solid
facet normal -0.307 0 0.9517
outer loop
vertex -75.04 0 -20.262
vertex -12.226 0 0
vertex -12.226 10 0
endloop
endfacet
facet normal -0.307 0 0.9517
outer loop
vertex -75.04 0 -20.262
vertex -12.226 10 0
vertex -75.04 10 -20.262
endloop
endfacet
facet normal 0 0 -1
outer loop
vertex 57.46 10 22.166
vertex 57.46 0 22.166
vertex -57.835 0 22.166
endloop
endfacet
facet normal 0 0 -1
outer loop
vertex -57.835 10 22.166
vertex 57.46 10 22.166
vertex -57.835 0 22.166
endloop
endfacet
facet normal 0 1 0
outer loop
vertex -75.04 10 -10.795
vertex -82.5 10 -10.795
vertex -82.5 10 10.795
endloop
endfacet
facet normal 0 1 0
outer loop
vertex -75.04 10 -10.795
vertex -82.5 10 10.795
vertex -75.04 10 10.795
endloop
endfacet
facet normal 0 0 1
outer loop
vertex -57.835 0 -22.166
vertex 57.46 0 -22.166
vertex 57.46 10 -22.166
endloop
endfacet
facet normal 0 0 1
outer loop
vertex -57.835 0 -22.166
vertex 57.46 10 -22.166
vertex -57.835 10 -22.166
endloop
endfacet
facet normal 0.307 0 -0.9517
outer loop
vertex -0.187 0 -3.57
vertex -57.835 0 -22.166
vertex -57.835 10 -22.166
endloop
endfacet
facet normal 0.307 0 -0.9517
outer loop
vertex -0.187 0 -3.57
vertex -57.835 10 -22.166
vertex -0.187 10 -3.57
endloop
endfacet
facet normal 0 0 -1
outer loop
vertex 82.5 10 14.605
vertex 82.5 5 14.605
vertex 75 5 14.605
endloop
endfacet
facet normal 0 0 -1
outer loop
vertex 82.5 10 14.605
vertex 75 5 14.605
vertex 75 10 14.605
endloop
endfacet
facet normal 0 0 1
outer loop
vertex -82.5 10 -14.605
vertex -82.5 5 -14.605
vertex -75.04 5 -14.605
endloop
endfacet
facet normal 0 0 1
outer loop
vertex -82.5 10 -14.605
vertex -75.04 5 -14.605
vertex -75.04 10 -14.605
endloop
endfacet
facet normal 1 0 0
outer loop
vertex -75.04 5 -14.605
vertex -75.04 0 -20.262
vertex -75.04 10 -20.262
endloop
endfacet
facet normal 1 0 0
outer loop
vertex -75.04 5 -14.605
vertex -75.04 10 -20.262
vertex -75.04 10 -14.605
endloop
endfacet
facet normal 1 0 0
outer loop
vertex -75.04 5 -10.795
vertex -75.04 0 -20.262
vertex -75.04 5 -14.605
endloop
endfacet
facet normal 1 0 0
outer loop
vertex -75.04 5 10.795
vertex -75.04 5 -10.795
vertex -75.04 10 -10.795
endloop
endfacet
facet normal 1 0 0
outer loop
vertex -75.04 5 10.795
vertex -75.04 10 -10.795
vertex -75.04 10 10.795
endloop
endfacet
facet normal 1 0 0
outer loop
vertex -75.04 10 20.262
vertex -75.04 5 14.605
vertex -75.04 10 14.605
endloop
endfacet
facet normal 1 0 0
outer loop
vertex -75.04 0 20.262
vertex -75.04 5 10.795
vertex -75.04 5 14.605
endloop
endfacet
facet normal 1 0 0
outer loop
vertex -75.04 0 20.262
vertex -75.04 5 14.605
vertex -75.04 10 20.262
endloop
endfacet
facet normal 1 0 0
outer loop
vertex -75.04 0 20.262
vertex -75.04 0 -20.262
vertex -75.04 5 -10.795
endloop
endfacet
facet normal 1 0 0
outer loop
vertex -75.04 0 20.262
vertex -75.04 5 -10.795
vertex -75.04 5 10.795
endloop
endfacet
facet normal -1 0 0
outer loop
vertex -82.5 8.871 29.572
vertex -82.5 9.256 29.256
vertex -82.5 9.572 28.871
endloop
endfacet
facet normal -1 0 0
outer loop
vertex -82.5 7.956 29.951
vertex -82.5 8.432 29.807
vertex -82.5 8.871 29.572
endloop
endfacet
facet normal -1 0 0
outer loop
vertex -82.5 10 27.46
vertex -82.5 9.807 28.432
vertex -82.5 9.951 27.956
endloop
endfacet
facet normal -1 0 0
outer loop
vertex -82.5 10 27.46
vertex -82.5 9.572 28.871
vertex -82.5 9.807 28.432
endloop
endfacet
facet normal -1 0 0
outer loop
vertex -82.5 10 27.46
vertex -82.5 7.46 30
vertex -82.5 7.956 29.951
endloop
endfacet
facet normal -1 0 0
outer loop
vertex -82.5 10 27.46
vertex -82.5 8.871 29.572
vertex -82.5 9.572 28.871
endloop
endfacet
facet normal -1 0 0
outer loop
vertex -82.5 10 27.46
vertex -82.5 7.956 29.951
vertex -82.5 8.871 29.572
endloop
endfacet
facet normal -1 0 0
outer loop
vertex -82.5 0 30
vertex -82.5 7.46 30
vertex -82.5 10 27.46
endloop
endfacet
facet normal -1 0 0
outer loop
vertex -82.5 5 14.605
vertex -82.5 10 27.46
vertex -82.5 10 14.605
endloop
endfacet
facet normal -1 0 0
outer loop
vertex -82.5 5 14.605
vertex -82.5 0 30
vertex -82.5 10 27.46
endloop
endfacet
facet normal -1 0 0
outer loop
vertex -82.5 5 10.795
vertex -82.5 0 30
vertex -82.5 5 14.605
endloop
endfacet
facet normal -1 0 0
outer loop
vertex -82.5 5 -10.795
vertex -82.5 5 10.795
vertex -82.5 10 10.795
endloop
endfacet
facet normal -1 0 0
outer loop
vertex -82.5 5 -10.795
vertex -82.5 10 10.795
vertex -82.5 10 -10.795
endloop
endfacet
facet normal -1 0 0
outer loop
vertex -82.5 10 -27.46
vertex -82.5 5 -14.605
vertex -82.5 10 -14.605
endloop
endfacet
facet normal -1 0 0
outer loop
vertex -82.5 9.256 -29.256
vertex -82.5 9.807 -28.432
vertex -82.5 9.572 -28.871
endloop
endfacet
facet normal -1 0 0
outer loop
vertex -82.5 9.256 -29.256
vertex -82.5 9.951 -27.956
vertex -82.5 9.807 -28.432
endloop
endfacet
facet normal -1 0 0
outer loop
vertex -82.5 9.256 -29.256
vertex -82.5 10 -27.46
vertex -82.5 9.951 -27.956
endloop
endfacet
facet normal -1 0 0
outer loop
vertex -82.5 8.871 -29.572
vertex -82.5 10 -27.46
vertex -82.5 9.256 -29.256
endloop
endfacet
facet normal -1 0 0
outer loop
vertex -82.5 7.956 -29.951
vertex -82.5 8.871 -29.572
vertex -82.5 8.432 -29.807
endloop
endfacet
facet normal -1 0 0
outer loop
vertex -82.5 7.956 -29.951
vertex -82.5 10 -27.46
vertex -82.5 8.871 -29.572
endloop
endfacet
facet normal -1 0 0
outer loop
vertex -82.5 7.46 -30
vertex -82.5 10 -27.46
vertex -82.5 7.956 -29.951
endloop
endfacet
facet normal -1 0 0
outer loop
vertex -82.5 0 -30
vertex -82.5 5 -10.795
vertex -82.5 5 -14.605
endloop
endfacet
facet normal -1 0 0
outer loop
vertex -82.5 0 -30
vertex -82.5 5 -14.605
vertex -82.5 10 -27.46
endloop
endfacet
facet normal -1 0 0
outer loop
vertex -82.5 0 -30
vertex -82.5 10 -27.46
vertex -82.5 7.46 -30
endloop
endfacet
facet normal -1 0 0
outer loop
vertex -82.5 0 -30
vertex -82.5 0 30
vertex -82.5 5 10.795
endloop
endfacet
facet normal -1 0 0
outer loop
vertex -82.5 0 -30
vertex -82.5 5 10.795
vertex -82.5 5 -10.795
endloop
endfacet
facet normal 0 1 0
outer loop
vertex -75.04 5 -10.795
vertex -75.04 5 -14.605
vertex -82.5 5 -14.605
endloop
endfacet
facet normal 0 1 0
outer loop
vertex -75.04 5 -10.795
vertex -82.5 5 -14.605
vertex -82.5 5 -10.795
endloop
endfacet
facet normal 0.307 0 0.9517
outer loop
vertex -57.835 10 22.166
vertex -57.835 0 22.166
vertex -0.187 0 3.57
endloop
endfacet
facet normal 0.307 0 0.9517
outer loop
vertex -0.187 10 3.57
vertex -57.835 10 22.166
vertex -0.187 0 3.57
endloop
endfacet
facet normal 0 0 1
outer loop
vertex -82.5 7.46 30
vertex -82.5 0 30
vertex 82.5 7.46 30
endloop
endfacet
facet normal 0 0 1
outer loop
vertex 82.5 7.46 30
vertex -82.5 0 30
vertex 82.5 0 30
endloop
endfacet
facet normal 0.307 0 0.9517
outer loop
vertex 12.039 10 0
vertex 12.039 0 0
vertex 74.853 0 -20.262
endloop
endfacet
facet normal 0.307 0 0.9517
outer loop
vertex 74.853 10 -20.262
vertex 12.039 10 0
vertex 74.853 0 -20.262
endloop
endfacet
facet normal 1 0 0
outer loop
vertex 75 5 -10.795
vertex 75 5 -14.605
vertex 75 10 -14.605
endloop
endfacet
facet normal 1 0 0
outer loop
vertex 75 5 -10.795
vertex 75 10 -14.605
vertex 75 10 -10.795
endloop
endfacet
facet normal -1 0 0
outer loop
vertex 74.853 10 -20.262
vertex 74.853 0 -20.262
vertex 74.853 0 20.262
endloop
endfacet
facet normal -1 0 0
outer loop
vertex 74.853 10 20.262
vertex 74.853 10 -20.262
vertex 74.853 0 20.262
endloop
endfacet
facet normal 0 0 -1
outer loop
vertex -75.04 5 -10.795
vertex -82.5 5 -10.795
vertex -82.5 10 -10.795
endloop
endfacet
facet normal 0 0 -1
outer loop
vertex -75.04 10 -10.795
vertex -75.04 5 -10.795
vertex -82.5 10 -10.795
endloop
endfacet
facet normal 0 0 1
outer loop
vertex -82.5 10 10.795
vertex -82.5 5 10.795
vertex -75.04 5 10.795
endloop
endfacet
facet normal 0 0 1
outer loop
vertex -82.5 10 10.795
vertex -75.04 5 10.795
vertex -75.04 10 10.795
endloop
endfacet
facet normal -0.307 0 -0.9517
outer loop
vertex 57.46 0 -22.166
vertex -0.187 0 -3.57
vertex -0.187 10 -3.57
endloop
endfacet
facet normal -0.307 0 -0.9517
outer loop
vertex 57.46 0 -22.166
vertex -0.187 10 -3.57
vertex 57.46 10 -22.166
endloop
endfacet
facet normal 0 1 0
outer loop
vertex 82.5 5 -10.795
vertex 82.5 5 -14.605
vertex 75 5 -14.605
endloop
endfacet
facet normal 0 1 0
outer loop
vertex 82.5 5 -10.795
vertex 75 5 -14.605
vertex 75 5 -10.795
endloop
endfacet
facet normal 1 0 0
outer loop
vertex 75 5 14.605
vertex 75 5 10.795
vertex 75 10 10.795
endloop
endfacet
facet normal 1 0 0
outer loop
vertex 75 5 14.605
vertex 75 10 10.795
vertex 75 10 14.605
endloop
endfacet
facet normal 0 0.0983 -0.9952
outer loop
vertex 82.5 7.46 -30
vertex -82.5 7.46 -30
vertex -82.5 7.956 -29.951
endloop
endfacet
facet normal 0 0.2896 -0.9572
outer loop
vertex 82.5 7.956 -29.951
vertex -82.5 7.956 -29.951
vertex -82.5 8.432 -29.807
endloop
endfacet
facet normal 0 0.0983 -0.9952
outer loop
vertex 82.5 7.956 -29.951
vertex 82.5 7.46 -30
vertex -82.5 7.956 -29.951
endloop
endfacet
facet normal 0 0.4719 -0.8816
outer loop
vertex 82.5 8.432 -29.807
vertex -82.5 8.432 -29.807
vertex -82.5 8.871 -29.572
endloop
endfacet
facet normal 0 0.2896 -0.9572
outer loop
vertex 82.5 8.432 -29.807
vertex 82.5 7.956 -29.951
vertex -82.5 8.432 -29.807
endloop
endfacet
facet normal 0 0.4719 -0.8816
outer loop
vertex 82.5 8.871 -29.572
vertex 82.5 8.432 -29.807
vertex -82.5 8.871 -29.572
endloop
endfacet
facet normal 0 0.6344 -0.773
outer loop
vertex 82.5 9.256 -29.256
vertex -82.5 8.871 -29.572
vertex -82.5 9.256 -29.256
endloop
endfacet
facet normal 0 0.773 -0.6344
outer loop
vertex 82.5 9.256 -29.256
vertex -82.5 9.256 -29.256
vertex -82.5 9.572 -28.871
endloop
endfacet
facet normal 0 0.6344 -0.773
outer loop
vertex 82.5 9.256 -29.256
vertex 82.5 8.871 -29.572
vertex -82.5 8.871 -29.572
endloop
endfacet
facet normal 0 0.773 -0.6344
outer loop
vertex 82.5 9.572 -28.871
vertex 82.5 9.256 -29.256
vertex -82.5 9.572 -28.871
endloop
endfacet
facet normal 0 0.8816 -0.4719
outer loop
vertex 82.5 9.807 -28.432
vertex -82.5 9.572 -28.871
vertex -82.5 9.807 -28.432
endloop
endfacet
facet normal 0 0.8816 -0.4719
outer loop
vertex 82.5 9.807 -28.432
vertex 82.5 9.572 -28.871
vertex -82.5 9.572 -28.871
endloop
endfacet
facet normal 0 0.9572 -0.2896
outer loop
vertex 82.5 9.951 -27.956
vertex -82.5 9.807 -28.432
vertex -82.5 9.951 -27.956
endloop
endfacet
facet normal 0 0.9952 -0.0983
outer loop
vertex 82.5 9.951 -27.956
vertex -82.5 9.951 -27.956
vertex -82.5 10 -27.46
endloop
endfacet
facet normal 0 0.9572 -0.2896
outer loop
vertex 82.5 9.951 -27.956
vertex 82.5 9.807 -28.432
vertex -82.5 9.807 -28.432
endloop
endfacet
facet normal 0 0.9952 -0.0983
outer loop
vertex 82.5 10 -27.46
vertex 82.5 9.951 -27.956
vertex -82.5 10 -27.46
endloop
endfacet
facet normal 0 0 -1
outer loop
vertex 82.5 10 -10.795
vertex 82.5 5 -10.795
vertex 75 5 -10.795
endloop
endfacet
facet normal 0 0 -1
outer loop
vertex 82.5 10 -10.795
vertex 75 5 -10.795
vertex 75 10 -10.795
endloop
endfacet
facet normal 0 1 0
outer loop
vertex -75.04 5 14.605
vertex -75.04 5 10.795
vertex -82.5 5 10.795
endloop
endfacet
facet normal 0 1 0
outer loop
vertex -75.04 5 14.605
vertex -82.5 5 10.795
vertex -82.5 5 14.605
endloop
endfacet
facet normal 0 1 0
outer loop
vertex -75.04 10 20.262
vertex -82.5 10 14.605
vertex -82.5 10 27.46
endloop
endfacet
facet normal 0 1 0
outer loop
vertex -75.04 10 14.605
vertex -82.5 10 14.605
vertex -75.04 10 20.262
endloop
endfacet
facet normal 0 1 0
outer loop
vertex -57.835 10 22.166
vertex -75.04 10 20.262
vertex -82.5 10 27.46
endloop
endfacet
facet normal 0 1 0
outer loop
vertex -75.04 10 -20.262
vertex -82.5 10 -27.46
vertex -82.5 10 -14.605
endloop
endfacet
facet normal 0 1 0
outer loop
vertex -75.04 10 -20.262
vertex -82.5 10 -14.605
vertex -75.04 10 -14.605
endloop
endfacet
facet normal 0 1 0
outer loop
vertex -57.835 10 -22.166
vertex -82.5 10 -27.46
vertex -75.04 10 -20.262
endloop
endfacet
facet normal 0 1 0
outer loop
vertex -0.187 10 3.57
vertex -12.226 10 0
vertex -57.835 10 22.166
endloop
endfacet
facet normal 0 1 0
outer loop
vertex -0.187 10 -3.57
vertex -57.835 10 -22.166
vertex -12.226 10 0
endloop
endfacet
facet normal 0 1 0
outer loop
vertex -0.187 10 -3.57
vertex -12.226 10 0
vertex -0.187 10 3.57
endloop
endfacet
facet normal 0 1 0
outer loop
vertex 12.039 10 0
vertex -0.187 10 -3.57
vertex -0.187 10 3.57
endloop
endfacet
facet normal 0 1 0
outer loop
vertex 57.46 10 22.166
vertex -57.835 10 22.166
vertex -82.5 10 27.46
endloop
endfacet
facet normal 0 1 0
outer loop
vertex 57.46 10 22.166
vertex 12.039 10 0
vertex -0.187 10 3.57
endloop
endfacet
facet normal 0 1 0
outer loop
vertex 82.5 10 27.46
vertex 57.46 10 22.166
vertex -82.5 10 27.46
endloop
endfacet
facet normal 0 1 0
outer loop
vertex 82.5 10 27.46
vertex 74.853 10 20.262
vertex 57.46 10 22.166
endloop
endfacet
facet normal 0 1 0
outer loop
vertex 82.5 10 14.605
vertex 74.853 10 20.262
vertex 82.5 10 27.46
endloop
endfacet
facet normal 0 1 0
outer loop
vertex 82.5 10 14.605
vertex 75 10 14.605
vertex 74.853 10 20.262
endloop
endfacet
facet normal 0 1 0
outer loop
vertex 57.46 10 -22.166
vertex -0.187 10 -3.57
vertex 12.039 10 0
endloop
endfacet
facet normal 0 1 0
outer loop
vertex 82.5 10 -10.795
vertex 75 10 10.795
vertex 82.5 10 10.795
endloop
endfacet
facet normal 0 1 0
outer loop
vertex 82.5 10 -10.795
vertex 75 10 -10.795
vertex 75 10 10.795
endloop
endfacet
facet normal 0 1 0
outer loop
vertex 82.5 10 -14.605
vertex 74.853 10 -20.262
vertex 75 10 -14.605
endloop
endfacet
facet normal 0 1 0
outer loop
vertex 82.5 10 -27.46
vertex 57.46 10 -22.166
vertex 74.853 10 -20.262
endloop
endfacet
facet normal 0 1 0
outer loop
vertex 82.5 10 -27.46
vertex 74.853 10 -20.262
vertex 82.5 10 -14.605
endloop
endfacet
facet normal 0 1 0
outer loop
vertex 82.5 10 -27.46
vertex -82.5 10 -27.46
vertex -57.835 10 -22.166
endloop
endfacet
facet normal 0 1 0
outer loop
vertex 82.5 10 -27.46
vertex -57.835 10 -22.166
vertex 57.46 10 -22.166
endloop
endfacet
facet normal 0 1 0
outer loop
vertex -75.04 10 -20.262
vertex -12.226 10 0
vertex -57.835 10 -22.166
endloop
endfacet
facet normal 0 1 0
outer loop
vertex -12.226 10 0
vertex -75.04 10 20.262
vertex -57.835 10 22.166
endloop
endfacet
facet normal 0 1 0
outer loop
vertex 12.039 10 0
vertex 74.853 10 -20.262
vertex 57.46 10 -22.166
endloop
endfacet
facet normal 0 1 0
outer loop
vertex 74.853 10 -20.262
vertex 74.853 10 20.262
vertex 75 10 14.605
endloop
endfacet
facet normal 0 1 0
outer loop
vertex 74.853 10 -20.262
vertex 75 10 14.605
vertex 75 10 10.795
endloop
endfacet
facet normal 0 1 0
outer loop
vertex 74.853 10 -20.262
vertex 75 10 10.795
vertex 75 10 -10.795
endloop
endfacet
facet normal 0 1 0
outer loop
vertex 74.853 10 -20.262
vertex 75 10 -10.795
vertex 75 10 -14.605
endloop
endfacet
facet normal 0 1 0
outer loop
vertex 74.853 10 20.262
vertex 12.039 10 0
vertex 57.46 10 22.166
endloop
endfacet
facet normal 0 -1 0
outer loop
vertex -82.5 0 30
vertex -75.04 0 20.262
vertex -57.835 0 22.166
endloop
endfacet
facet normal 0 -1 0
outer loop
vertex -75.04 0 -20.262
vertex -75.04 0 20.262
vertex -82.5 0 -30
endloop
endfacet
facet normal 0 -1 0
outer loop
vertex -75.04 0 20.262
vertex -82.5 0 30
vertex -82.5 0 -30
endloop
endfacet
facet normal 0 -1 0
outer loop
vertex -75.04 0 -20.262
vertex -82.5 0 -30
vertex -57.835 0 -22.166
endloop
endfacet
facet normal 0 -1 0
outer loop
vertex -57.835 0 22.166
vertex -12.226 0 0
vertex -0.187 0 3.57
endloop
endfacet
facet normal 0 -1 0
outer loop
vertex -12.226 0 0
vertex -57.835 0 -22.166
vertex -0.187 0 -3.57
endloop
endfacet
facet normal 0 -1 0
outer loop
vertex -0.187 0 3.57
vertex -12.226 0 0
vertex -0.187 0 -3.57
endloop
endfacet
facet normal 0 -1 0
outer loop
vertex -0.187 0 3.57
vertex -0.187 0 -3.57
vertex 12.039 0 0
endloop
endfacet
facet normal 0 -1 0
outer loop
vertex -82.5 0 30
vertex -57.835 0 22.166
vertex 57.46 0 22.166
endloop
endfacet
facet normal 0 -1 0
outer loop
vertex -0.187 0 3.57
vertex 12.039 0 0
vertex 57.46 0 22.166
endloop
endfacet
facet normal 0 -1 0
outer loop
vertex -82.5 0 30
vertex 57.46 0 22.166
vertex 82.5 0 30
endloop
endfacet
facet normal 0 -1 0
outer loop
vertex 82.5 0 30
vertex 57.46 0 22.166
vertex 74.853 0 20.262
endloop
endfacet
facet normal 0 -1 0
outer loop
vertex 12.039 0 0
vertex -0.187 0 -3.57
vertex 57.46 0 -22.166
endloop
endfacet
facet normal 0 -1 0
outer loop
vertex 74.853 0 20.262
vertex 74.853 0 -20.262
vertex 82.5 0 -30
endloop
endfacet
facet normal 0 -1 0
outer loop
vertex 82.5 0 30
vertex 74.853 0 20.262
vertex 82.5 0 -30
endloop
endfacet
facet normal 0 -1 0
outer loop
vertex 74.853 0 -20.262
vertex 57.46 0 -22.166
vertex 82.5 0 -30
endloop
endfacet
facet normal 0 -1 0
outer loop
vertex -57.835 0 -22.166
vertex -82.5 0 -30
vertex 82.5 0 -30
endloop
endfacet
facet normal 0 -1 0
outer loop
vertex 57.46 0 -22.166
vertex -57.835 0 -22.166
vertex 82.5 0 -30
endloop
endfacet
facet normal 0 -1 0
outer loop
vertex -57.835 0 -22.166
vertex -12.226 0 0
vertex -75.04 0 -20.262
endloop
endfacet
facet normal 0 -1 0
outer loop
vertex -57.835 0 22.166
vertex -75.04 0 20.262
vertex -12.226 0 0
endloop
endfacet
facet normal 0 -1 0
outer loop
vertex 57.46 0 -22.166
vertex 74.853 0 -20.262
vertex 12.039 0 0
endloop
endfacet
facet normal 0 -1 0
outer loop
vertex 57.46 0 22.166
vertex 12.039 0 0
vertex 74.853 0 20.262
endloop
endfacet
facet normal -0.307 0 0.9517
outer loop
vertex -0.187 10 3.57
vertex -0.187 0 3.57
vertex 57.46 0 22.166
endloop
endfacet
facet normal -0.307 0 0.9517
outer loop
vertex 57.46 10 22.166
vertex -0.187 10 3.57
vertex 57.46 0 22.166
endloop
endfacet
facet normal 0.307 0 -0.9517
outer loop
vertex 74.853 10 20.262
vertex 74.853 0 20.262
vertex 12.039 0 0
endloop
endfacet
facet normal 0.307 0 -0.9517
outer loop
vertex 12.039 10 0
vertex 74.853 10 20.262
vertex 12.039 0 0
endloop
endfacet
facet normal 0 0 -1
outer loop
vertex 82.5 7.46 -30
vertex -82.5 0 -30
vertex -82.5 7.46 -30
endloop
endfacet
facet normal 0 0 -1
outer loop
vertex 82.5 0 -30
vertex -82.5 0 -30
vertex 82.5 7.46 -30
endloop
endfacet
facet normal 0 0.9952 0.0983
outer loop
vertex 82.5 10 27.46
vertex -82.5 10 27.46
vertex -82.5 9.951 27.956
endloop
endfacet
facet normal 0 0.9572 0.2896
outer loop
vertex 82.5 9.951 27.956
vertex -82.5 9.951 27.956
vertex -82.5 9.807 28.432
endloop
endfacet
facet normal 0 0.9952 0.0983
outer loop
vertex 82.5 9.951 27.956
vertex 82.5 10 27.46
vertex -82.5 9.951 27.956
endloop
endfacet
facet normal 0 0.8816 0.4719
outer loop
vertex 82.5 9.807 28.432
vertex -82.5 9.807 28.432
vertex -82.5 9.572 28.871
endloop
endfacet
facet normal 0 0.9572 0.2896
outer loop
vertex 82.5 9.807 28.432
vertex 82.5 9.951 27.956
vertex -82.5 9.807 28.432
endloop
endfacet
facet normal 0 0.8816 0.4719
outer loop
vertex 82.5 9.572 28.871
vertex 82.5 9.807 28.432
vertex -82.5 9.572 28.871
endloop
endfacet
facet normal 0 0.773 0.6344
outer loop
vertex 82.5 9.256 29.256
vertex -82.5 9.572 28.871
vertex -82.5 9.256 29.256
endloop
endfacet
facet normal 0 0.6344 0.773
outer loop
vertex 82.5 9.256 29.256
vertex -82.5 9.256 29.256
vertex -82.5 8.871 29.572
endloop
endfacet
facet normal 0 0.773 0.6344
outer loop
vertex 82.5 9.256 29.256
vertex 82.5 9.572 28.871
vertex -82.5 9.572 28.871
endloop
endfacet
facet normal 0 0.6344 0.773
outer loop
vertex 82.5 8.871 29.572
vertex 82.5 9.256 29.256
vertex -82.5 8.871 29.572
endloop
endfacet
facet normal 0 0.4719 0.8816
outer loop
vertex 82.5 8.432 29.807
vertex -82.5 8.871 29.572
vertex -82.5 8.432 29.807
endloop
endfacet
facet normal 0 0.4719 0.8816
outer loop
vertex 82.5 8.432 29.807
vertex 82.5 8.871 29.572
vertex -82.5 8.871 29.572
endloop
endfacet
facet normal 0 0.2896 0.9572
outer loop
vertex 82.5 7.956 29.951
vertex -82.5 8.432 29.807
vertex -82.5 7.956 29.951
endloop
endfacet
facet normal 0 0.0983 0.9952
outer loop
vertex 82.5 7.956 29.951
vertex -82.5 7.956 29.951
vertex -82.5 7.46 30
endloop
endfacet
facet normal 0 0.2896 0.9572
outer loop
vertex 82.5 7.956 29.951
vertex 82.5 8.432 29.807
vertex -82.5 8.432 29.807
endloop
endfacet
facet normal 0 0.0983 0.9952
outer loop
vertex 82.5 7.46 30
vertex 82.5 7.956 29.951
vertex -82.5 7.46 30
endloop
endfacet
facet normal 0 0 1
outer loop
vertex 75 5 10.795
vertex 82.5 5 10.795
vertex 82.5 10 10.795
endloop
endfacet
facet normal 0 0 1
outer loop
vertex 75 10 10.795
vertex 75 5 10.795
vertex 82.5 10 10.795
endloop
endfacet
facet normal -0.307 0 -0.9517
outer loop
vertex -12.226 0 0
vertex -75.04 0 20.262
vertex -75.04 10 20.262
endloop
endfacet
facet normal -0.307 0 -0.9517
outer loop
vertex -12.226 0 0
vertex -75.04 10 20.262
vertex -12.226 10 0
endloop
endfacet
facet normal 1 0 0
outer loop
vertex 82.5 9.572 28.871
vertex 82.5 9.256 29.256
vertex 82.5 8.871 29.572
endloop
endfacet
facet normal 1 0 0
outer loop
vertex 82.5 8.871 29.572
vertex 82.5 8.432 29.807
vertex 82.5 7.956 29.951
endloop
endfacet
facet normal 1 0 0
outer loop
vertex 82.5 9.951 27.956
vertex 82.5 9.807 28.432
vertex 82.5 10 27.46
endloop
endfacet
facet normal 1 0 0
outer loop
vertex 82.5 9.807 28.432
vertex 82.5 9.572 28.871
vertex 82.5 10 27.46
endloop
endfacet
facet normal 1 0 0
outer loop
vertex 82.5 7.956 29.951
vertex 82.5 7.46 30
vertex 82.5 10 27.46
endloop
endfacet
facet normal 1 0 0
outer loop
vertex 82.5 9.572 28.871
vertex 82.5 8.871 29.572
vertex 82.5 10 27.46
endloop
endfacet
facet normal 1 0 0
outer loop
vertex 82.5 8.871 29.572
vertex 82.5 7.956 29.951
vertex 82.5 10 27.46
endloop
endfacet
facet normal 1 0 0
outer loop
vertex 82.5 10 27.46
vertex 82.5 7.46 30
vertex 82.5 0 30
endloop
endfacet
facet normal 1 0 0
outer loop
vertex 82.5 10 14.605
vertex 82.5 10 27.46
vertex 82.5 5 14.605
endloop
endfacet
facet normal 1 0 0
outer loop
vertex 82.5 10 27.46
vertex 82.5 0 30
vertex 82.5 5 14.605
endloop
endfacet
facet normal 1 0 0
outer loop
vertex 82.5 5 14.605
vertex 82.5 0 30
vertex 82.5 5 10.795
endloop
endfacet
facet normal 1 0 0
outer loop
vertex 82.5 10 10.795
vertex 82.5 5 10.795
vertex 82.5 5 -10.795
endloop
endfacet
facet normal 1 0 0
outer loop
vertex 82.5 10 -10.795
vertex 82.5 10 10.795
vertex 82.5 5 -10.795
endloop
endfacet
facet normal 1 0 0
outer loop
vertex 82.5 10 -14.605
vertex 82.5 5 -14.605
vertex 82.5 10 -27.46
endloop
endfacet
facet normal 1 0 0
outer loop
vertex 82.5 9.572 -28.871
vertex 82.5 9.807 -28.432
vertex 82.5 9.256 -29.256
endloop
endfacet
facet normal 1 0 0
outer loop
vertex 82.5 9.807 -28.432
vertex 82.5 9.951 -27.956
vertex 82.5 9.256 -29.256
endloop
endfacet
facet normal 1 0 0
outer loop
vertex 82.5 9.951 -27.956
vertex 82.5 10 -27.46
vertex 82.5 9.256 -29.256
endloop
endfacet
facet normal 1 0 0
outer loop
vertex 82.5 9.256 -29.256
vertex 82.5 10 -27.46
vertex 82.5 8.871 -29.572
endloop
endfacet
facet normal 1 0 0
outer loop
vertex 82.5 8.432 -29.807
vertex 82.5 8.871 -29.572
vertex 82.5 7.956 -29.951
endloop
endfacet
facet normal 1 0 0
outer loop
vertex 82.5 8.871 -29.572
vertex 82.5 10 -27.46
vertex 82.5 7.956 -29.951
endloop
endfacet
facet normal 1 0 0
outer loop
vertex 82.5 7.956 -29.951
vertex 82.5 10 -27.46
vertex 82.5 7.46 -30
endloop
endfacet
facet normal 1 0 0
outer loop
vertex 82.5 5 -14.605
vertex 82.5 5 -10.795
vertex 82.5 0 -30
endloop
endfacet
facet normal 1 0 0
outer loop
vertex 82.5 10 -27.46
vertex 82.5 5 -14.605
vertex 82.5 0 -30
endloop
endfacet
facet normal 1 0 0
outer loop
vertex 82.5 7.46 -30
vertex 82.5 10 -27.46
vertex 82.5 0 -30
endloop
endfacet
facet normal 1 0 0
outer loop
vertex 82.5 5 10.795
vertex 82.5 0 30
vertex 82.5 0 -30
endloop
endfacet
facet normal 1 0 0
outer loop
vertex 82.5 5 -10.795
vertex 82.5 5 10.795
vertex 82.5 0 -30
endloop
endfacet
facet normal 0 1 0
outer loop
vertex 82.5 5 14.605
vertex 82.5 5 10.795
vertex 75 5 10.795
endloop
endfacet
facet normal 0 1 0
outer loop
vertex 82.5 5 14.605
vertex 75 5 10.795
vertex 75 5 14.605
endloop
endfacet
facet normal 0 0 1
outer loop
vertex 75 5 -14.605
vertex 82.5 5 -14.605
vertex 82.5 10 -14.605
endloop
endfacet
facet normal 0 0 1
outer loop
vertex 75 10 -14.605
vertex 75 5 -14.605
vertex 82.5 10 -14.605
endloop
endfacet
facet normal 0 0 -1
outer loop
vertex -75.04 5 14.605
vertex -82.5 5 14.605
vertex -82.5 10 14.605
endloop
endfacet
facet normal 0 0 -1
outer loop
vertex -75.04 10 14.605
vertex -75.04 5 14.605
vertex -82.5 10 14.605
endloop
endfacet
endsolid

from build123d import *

# Parameters (mm, degrees)
SKETCH1_W           = 165
SKETCH1_H           = 60
BOSS_EXTRUDE1_DEPTH = 10
SKETCH2_W           = 3.81
SKETCH2_H           = 5
CUT_EXTRUDE1_DEPTH  = 7.5
FILLET1_R           = 2.54


with BuildPart() as part:
    # Sketch1 → Boss-Extrude1 (new body)
    with BuildSketch(Plane(origin=(0, 0, 0), x_dir=(1, 0, 0), z_dir=(0, 1, 0))):
        Rectangle(SKETCH1_W, SKETCH1_H)
        Polygon((-75.04, 20.262432489), (-75.04, -20.262432489), (-12.226459283, 0), align=None, mode=Mode.SUBTRACT)
        Polygon((57.460458264, 22.165834991), (-57.834623171, 22.165834991), (-0.187082453, 3.569854115), align=None, mode=Mode.SUBTRACT)
        Polygon((74.852917547, 20.262432489), (74.852917547, -20.262432489), (12.039376829, 0), align=None, mode=Mode.SUBTRACT)
        Polygon((-57.834623171, -22.165834991), (-0.187082453, -3.569854115), (57.460458264, -22.165834991), align=None, mode=Mode.SUBTRACT)
    extrude(amount=BOSS_EXTRUDE1_DEPTH)

    # Sketch2 → Cut-Extrude1 (cut)
    with BuildSketch(Plane.ZY.offset(82.5)):
        with Locations((-12.7, 7.5)):
            Rectangle(SKETCH2_W, SKETCH2_H)
        with Locations((12.7, 7.5)):
            Rectangle(SKETCH2_W, SKETCH2_H)
    cut_extrude1 = extrude(amount=-CUT_EXTRUDE1_DEPTH, mode=Mode.SUBTRACT)

    # Mirror1: Cut-Extrude1 across plane
    add(cut_extrude1.mirror(Plane(origin=(0, 0, 0), x_dir=(0, 0, 1), z_dir=(1, 0, 0))), mode=Mode.SUBTRACT)

    # Fillet1
    fillet1_edges = [part.edges().sort_by_distance(p)[0] for p in [
        (0, 10, -30),
        (0, 10, 30),
    ]]
    fillet(fillet1_edges, radius=FILLET1_R)


solid = part.part
